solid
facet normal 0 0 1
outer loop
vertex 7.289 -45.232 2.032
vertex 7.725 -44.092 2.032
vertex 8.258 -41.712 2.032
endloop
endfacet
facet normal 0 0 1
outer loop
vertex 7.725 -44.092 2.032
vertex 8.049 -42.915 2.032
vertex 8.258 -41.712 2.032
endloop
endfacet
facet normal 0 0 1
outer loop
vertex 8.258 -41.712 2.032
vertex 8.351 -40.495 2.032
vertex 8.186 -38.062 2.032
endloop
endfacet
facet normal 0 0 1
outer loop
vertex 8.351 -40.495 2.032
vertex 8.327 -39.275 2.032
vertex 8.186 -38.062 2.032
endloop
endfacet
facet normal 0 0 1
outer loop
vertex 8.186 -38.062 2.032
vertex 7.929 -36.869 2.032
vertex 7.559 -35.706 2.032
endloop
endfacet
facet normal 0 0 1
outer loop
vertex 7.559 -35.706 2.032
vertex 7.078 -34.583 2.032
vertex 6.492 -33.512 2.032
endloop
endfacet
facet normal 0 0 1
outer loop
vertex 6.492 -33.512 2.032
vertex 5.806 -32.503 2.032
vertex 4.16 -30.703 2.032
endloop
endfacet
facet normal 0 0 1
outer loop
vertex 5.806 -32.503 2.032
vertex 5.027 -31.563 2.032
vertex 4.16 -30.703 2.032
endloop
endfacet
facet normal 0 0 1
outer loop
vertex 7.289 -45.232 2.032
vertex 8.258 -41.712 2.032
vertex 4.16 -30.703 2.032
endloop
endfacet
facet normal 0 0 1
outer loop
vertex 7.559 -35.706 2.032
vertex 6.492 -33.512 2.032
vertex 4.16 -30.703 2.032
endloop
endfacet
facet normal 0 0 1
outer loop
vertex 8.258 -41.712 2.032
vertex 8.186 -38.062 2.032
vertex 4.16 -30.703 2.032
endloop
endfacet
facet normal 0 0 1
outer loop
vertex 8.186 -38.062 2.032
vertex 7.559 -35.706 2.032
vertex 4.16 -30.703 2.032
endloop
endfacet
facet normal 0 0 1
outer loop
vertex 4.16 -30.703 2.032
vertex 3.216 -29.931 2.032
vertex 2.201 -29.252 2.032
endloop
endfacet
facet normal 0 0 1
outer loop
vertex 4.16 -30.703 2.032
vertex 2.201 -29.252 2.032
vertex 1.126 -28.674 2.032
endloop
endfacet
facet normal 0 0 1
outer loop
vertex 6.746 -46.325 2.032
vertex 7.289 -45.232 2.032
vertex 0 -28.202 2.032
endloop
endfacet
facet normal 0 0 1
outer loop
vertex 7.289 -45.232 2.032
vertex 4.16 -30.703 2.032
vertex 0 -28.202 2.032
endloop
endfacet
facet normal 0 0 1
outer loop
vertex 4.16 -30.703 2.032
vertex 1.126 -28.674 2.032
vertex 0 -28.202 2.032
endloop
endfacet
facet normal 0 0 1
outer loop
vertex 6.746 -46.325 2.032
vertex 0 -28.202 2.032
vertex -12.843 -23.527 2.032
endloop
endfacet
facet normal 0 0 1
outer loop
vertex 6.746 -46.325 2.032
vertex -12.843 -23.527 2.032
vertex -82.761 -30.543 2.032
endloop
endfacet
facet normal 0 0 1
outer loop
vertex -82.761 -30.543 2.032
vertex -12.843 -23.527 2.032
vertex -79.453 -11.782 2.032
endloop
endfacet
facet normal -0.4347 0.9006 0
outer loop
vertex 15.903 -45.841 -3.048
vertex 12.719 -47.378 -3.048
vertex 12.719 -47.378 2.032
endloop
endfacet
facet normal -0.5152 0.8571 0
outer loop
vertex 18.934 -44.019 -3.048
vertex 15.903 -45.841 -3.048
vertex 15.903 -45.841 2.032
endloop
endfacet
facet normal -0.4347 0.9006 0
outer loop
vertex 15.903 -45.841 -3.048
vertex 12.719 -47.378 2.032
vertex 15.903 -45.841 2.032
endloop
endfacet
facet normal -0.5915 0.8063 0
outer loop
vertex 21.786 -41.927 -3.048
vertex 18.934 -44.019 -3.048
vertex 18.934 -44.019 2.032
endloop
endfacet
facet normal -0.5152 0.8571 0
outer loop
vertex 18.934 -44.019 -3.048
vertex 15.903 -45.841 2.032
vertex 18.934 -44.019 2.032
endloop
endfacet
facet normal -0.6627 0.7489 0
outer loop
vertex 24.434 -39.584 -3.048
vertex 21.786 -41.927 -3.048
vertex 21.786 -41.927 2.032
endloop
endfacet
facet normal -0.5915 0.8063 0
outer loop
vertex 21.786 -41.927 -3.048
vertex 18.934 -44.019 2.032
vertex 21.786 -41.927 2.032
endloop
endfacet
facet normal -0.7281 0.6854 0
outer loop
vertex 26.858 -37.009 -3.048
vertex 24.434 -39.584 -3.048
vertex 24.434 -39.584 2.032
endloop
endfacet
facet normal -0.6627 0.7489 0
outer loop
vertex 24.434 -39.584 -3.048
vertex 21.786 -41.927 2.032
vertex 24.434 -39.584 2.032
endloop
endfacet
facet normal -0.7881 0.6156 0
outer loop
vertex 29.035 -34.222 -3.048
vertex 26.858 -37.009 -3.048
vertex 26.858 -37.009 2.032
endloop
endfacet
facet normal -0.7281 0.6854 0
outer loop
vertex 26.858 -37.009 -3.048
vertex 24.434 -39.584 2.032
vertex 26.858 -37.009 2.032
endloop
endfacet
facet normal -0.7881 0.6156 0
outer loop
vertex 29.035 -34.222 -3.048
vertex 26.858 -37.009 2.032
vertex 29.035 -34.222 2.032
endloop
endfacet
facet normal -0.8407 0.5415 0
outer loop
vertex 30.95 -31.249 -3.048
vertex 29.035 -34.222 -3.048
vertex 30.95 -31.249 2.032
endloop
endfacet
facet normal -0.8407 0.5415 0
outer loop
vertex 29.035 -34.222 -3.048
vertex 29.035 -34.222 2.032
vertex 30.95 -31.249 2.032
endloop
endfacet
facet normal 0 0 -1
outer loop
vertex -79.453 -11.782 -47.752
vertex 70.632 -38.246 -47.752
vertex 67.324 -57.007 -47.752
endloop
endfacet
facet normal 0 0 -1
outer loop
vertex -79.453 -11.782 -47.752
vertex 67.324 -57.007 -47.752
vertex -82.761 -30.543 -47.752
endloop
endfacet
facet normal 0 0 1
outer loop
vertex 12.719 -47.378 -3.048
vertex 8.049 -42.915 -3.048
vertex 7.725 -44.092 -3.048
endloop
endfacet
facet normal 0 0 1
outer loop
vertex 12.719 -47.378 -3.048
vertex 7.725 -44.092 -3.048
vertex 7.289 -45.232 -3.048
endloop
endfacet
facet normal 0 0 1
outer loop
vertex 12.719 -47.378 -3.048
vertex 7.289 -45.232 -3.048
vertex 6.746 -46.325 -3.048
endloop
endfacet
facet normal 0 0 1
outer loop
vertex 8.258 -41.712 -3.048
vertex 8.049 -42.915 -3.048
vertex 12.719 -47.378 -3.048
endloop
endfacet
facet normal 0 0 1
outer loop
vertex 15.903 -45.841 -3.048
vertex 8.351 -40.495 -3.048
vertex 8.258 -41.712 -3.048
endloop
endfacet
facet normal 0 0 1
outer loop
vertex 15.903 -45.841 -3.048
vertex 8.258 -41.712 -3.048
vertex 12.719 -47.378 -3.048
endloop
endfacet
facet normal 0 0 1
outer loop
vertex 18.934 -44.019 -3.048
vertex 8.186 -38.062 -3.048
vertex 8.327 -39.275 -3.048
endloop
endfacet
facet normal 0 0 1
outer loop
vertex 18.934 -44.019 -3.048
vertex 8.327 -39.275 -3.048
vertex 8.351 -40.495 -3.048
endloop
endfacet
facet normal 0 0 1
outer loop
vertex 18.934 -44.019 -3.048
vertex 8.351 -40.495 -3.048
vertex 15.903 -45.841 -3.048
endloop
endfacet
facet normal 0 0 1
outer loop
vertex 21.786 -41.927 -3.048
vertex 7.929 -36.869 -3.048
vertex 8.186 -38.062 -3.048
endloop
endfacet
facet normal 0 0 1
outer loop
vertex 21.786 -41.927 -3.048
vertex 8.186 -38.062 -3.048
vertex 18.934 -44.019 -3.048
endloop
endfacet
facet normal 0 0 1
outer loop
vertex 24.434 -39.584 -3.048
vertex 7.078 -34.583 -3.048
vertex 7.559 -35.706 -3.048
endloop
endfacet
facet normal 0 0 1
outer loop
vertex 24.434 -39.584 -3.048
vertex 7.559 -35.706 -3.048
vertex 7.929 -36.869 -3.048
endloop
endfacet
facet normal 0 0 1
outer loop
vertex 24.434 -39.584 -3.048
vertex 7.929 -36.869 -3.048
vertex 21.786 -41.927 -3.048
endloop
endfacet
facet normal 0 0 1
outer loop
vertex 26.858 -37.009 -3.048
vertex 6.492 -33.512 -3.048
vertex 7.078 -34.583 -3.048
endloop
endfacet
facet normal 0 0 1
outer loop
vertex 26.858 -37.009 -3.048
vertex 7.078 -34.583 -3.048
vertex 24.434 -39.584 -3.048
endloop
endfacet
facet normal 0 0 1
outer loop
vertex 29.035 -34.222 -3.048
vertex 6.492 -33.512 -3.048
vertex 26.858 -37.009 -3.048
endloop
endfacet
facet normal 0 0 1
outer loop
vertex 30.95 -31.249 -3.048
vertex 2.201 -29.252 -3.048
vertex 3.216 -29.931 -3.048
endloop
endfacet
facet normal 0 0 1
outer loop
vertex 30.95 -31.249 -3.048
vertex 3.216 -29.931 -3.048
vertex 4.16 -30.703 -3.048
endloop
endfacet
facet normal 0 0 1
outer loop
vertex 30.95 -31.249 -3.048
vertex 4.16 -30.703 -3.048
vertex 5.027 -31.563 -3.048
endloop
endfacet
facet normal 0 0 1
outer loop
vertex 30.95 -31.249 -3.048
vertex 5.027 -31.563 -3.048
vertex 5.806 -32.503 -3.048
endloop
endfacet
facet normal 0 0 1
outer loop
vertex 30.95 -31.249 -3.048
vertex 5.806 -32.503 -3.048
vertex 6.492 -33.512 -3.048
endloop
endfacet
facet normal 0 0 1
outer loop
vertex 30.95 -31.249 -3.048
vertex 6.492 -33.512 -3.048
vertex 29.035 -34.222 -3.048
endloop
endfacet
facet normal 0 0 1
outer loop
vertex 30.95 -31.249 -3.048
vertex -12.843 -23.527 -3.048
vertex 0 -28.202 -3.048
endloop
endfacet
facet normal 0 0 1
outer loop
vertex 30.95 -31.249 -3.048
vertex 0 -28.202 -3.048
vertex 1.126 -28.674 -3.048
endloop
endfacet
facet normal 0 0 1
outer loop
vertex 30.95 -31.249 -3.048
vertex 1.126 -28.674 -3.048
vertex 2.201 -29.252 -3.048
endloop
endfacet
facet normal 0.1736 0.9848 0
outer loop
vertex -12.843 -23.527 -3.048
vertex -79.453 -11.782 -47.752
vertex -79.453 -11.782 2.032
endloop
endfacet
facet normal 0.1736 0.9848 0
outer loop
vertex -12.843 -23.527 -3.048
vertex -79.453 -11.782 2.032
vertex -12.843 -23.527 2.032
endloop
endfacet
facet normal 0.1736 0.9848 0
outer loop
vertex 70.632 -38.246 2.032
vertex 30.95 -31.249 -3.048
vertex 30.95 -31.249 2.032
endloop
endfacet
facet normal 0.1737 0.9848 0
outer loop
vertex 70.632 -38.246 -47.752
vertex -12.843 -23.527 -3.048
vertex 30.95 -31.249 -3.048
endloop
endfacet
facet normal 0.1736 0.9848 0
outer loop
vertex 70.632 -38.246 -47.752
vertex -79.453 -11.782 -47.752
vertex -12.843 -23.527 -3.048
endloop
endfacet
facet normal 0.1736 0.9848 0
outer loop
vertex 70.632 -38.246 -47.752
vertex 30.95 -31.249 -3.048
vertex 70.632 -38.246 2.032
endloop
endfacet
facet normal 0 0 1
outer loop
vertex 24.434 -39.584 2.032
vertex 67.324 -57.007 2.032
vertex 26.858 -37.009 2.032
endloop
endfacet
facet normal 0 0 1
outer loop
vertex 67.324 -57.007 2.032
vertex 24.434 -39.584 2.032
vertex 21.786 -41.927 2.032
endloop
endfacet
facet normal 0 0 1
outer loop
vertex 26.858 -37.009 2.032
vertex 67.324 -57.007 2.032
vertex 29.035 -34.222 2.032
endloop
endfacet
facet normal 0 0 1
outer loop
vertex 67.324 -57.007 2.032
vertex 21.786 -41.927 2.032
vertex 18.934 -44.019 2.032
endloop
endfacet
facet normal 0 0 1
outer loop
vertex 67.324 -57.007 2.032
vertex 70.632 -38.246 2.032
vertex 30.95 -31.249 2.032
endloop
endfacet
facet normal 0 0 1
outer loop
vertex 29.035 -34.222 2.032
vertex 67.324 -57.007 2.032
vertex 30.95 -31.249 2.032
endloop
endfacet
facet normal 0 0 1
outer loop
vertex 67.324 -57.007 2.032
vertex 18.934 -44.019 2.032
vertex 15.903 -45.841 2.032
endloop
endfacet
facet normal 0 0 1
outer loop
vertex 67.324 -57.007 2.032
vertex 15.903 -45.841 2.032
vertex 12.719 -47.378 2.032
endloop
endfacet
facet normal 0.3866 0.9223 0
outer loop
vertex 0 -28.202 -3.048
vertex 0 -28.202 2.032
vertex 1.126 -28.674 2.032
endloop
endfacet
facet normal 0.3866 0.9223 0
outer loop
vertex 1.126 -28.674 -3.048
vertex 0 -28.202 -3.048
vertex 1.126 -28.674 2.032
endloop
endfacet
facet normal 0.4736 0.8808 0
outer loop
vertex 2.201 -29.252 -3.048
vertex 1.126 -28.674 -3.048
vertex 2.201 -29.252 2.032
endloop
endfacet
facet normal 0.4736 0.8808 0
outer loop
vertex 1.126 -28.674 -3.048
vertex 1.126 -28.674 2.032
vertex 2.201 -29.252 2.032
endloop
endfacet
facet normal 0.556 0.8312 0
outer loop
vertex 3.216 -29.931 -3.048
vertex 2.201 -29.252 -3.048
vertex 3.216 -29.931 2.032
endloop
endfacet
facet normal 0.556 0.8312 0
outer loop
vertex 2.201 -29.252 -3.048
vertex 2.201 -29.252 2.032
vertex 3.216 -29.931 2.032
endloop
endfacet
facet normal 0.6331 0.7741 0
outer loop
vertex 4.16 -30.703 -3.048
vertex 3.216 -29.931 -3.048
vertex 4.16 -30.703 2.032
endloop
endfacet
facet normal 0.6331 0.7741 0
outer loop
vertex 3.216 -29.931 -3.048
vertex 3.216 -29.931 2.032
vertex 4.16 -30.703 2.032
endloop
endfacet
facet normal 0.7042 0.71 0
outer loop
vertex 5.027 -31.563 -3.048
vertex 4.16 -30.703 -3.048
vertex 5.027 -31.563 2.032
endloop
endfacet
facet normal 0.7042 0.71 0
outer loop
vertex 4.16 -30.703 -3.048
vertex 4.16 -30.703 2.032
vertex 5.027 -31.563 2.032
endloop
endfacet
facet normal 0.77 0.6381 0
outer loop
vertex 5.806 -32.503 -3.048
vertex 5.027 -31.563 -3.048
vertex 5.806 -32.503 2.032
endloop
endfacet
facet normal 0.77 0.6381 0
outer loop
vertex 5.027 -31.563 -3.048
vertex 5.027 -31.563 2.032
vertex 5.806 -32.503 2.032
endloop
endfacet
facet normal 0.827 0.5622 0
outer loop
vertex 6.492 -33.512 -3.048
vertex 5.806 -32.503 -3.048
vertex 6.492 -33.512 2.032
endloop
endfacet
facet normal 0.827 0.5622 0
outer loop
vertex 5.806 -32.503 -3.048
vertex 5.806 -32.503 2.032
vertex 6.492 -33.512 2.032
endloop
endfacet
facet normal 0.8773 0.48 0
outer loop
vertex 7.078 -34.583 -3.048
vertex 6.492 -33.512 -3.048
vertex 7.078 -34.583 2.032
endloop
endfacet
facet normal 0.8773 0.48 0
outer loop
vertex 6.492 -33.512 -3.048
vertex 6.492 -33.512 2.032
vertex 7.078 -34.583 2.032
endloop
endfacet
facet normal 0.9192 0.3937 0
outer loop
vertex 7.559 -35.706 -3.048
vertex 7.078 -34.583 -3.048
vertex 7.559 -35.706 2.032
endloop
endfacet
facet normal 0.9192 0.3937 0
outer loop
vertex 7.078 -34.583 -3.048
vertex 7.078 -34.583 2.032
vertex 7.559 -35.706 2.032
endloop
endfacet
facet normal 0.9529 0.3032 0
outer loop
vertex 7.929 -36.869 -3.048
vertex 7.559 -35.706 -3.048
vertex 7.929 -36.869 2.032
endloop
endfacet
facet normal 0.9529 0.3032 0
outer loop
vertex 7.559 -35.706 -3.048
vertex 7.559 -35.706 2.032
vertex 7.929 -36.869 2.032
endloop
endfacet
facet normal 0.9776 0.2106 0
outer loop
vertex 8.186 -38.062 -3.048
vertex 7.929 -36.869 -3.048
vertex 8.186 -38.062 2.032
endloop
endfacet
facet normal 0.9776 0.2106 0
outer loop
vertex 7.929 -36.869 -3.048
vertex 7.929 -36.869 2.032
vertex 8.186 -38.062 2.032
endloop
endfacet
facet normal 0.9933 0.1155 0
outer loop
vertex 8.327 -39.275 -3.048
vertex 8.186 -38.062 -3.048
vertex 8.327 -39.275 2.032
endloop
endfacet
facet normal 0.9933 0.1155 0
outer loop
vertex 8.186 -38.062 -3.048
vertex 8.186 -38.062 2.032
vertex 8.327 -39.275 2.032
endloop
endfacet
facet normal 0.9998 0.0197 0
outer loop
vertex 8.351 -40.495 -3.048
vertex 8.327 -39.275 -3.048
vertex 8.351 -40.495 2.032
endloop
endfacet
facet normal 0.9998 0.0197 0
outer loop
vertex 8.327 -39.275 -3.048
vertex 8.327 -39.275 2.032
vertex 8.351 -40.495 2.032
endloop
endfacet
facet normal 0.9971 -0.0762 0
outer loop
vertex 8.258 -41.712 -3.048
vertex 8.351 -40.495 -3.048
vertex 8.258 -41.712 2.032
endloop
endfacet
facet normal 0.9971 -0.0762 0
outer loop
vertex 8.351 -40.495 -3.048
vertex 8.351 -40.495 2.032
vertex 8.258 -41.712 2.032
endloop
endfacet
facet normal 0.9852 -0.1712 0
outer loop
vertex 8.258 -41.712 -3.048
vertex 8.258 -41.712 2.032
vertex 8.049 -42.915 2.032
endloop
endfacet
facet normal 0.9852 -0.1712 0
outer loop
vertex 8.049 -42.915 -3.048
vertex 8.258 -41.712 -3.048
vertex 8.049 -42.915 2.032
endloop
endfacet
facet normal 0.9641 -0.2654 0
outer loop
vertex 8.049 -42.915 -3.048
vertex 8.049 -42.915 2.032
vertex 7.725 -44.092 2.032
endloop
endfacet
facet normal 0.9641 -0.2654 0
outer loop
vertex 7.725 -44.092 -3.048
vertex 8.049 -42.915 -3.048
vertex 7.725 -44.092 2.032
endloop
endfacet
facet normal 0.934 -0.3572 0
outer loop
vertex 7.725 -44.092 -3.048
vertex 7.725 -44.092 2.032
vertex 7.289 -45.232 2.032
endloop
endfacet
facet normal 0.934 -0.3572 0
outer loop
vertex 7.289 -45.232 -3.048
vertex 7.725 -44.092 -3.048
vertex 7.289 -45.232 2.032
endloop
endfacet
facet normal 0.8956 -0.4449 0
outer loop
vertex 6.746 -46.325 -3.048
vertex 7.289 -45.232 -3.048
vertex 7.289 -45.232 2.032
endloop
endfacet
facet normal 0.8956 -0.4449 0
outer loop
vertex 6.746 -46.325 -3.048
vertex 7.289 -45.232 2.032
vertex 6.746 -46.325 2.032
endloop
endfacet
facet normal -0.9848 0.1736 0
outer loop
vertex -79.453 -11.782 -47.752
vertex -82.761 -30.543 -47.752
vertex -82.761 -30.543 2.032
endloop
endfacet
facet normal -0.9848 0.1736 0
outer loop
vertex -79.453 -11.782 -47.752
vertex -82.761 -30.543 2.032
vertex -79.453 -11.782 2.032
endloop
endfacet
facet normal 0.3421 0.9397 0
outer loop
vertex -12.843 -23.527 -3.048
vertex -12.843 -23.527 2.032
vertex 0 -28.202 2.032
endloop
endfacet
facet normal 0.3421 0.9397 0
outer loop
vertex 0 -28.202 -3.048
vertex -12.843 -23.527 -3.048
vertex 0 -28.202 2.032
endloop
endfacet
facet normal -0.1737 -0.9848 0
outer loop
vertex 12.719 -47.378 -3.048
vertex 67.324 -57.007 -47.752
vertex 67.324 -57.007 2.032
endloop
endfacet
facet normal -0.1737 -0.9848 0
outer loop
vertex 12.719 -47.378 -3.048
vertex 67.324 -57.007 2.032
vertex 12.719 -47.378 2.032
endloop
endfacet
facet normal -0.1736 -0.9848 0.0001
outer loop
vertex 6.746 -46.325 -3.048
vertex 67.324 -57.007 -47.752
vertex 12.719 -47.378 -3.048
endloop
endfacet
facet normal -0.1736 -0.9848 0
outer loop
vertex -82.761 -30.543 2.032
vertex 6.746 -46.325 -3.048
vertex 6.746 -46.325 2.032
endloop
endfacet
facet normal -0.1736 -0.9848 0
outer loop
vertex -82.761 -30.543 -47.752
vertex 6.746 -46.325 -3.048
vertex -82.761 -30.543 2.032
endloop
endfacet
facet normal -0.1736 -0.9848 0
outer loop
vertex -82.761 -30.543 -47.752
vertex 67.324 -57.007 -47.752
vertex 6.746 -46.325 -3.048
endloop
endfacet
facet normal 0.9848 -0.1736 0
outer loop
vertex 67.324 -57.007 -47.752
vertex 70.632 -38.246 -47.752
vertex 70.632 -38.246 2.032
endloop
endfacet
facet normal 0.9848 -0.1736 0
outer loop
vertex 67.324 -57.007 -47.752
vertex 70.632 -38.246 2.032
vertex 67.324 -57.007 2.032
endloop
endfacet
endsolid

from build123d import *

# Parameters (mm, degrees)
BOSS_EXTRUDE1_DEPTH        = 3.048
BOSS_EXTRUDE2_DEPTH        = 2.032
BOSS_EXTRUDE2_DEPTH_BACK   = 47.752
BOSS_EXTRUDE2_2_DEPTH      = 2.032
BOSS_EXTRUDE2_2_DEPTH_BACK = 47.752


with BuildPart() as part:
    # Sketch1 → Boss-Extrude1 (new, symmetric)
    with BuildSketch(Plane.XY):
        with BuildLine():
            ThreePointArc((0, 27.535484012), (-9.412998127, 39.802742006), (0, 52.07))
            Line((0, 52.07), (-11.040532194, 49.111698314))
            ThreePointArc((-11.040532194, 49.111698314), (-39.066320922, 14.192289272), (-14.190605813, -23.03684931))
            Line((-14.190605813, -23.03684931), (0, -28.201807432))
            ThreePointArc((0, -28.201807432), (8.35634418, -40.135903716), (0, -52.07))
            Line((0, -52.07), (10.740686656, -48.160709762))
            ThreePointArc((10.740686656, -48.160709762), (36.144496882, -10.141220984), (7.52373904, 25.519504212))
            Line((7.52373904, 25.519504212), (0, 27.535484012))
        make_face()
        with BuildLine():
            Line((-12.7, 7.332348419), (-1.374815329, 13.870946837))
            ThreePointArc((-1.374815329, 13.870946837), (-0.410875234, 16.198104087), (1.5875, 14.664696837))
            ThreePointArc((1.5875, 14.664696837), (1.533407249, 14.253821603), (1.374815329, 13.870946837))
            Line((1.374815329, 13.870946837), (12.7, 7.332348419))
            Line((12.7, 7.332348419), (12.7, -7.332348419))
            Line((12.7, -7.332348419), (0, -14.664696837))
            Line((0, -14.664696837), (-12.7, -7.332348419))
            Line((-12.7, -7.332348419), (-12.7, 7.332348419))
        make_face(mode=Mode.SUBTRACT)
    extrude(amount=BOSS_EXTRUDE1_DEPTH, both=True)


with BuildPart() as body_2:
    # Sketch2 → Boss-Extrude2 (new, two sides: drawn at the far end of the back side and taken through both)
    with BuildSketch(Plane.XY.offset(-BOSS_EXTRUDE2_DEPTH_BACK)):
        Polygon((-70.631687067, 38.246108065), (79.453014492, 11.782125788), (82.761012277, 30.542713483), (-67.323689282, 57.00669576), align=None)
    extrude(amount=BOSS_EXTRUDE2_DEPTH + BOSS_EXTRUDE2_DEPTH_BACK)


with BuildPart() as body_3:
    # Sketch2 → Boss-Extrude2 2 (new, two sides: drawn at the far end of the back side and taken through both)
    with BuildSketch(Plane.XY.offset(-BOSS_EXTRUDE2_2_DEPTH_BACK)):
        Polygon((-79.453014492, -11.782125788), (70.631687067, -38.246108065), (67.323689282, -57.00669576), (-82.761012277, -30.542713483), align=None)
    extrude(amount=BOSS_EXTRUDE2_2_DEPTH + BOSS_EXTRUDE2_2_DEPTH_BACK)

    # Intersect1: read off the stored shape, not the designer's step
    # Intersect1: cut body 2, part
    add(body_2.part, mode=Mode.SUBTRACT)
    add(part.part, mode=Mode.SUBTRACT)


solid = body_3.part
